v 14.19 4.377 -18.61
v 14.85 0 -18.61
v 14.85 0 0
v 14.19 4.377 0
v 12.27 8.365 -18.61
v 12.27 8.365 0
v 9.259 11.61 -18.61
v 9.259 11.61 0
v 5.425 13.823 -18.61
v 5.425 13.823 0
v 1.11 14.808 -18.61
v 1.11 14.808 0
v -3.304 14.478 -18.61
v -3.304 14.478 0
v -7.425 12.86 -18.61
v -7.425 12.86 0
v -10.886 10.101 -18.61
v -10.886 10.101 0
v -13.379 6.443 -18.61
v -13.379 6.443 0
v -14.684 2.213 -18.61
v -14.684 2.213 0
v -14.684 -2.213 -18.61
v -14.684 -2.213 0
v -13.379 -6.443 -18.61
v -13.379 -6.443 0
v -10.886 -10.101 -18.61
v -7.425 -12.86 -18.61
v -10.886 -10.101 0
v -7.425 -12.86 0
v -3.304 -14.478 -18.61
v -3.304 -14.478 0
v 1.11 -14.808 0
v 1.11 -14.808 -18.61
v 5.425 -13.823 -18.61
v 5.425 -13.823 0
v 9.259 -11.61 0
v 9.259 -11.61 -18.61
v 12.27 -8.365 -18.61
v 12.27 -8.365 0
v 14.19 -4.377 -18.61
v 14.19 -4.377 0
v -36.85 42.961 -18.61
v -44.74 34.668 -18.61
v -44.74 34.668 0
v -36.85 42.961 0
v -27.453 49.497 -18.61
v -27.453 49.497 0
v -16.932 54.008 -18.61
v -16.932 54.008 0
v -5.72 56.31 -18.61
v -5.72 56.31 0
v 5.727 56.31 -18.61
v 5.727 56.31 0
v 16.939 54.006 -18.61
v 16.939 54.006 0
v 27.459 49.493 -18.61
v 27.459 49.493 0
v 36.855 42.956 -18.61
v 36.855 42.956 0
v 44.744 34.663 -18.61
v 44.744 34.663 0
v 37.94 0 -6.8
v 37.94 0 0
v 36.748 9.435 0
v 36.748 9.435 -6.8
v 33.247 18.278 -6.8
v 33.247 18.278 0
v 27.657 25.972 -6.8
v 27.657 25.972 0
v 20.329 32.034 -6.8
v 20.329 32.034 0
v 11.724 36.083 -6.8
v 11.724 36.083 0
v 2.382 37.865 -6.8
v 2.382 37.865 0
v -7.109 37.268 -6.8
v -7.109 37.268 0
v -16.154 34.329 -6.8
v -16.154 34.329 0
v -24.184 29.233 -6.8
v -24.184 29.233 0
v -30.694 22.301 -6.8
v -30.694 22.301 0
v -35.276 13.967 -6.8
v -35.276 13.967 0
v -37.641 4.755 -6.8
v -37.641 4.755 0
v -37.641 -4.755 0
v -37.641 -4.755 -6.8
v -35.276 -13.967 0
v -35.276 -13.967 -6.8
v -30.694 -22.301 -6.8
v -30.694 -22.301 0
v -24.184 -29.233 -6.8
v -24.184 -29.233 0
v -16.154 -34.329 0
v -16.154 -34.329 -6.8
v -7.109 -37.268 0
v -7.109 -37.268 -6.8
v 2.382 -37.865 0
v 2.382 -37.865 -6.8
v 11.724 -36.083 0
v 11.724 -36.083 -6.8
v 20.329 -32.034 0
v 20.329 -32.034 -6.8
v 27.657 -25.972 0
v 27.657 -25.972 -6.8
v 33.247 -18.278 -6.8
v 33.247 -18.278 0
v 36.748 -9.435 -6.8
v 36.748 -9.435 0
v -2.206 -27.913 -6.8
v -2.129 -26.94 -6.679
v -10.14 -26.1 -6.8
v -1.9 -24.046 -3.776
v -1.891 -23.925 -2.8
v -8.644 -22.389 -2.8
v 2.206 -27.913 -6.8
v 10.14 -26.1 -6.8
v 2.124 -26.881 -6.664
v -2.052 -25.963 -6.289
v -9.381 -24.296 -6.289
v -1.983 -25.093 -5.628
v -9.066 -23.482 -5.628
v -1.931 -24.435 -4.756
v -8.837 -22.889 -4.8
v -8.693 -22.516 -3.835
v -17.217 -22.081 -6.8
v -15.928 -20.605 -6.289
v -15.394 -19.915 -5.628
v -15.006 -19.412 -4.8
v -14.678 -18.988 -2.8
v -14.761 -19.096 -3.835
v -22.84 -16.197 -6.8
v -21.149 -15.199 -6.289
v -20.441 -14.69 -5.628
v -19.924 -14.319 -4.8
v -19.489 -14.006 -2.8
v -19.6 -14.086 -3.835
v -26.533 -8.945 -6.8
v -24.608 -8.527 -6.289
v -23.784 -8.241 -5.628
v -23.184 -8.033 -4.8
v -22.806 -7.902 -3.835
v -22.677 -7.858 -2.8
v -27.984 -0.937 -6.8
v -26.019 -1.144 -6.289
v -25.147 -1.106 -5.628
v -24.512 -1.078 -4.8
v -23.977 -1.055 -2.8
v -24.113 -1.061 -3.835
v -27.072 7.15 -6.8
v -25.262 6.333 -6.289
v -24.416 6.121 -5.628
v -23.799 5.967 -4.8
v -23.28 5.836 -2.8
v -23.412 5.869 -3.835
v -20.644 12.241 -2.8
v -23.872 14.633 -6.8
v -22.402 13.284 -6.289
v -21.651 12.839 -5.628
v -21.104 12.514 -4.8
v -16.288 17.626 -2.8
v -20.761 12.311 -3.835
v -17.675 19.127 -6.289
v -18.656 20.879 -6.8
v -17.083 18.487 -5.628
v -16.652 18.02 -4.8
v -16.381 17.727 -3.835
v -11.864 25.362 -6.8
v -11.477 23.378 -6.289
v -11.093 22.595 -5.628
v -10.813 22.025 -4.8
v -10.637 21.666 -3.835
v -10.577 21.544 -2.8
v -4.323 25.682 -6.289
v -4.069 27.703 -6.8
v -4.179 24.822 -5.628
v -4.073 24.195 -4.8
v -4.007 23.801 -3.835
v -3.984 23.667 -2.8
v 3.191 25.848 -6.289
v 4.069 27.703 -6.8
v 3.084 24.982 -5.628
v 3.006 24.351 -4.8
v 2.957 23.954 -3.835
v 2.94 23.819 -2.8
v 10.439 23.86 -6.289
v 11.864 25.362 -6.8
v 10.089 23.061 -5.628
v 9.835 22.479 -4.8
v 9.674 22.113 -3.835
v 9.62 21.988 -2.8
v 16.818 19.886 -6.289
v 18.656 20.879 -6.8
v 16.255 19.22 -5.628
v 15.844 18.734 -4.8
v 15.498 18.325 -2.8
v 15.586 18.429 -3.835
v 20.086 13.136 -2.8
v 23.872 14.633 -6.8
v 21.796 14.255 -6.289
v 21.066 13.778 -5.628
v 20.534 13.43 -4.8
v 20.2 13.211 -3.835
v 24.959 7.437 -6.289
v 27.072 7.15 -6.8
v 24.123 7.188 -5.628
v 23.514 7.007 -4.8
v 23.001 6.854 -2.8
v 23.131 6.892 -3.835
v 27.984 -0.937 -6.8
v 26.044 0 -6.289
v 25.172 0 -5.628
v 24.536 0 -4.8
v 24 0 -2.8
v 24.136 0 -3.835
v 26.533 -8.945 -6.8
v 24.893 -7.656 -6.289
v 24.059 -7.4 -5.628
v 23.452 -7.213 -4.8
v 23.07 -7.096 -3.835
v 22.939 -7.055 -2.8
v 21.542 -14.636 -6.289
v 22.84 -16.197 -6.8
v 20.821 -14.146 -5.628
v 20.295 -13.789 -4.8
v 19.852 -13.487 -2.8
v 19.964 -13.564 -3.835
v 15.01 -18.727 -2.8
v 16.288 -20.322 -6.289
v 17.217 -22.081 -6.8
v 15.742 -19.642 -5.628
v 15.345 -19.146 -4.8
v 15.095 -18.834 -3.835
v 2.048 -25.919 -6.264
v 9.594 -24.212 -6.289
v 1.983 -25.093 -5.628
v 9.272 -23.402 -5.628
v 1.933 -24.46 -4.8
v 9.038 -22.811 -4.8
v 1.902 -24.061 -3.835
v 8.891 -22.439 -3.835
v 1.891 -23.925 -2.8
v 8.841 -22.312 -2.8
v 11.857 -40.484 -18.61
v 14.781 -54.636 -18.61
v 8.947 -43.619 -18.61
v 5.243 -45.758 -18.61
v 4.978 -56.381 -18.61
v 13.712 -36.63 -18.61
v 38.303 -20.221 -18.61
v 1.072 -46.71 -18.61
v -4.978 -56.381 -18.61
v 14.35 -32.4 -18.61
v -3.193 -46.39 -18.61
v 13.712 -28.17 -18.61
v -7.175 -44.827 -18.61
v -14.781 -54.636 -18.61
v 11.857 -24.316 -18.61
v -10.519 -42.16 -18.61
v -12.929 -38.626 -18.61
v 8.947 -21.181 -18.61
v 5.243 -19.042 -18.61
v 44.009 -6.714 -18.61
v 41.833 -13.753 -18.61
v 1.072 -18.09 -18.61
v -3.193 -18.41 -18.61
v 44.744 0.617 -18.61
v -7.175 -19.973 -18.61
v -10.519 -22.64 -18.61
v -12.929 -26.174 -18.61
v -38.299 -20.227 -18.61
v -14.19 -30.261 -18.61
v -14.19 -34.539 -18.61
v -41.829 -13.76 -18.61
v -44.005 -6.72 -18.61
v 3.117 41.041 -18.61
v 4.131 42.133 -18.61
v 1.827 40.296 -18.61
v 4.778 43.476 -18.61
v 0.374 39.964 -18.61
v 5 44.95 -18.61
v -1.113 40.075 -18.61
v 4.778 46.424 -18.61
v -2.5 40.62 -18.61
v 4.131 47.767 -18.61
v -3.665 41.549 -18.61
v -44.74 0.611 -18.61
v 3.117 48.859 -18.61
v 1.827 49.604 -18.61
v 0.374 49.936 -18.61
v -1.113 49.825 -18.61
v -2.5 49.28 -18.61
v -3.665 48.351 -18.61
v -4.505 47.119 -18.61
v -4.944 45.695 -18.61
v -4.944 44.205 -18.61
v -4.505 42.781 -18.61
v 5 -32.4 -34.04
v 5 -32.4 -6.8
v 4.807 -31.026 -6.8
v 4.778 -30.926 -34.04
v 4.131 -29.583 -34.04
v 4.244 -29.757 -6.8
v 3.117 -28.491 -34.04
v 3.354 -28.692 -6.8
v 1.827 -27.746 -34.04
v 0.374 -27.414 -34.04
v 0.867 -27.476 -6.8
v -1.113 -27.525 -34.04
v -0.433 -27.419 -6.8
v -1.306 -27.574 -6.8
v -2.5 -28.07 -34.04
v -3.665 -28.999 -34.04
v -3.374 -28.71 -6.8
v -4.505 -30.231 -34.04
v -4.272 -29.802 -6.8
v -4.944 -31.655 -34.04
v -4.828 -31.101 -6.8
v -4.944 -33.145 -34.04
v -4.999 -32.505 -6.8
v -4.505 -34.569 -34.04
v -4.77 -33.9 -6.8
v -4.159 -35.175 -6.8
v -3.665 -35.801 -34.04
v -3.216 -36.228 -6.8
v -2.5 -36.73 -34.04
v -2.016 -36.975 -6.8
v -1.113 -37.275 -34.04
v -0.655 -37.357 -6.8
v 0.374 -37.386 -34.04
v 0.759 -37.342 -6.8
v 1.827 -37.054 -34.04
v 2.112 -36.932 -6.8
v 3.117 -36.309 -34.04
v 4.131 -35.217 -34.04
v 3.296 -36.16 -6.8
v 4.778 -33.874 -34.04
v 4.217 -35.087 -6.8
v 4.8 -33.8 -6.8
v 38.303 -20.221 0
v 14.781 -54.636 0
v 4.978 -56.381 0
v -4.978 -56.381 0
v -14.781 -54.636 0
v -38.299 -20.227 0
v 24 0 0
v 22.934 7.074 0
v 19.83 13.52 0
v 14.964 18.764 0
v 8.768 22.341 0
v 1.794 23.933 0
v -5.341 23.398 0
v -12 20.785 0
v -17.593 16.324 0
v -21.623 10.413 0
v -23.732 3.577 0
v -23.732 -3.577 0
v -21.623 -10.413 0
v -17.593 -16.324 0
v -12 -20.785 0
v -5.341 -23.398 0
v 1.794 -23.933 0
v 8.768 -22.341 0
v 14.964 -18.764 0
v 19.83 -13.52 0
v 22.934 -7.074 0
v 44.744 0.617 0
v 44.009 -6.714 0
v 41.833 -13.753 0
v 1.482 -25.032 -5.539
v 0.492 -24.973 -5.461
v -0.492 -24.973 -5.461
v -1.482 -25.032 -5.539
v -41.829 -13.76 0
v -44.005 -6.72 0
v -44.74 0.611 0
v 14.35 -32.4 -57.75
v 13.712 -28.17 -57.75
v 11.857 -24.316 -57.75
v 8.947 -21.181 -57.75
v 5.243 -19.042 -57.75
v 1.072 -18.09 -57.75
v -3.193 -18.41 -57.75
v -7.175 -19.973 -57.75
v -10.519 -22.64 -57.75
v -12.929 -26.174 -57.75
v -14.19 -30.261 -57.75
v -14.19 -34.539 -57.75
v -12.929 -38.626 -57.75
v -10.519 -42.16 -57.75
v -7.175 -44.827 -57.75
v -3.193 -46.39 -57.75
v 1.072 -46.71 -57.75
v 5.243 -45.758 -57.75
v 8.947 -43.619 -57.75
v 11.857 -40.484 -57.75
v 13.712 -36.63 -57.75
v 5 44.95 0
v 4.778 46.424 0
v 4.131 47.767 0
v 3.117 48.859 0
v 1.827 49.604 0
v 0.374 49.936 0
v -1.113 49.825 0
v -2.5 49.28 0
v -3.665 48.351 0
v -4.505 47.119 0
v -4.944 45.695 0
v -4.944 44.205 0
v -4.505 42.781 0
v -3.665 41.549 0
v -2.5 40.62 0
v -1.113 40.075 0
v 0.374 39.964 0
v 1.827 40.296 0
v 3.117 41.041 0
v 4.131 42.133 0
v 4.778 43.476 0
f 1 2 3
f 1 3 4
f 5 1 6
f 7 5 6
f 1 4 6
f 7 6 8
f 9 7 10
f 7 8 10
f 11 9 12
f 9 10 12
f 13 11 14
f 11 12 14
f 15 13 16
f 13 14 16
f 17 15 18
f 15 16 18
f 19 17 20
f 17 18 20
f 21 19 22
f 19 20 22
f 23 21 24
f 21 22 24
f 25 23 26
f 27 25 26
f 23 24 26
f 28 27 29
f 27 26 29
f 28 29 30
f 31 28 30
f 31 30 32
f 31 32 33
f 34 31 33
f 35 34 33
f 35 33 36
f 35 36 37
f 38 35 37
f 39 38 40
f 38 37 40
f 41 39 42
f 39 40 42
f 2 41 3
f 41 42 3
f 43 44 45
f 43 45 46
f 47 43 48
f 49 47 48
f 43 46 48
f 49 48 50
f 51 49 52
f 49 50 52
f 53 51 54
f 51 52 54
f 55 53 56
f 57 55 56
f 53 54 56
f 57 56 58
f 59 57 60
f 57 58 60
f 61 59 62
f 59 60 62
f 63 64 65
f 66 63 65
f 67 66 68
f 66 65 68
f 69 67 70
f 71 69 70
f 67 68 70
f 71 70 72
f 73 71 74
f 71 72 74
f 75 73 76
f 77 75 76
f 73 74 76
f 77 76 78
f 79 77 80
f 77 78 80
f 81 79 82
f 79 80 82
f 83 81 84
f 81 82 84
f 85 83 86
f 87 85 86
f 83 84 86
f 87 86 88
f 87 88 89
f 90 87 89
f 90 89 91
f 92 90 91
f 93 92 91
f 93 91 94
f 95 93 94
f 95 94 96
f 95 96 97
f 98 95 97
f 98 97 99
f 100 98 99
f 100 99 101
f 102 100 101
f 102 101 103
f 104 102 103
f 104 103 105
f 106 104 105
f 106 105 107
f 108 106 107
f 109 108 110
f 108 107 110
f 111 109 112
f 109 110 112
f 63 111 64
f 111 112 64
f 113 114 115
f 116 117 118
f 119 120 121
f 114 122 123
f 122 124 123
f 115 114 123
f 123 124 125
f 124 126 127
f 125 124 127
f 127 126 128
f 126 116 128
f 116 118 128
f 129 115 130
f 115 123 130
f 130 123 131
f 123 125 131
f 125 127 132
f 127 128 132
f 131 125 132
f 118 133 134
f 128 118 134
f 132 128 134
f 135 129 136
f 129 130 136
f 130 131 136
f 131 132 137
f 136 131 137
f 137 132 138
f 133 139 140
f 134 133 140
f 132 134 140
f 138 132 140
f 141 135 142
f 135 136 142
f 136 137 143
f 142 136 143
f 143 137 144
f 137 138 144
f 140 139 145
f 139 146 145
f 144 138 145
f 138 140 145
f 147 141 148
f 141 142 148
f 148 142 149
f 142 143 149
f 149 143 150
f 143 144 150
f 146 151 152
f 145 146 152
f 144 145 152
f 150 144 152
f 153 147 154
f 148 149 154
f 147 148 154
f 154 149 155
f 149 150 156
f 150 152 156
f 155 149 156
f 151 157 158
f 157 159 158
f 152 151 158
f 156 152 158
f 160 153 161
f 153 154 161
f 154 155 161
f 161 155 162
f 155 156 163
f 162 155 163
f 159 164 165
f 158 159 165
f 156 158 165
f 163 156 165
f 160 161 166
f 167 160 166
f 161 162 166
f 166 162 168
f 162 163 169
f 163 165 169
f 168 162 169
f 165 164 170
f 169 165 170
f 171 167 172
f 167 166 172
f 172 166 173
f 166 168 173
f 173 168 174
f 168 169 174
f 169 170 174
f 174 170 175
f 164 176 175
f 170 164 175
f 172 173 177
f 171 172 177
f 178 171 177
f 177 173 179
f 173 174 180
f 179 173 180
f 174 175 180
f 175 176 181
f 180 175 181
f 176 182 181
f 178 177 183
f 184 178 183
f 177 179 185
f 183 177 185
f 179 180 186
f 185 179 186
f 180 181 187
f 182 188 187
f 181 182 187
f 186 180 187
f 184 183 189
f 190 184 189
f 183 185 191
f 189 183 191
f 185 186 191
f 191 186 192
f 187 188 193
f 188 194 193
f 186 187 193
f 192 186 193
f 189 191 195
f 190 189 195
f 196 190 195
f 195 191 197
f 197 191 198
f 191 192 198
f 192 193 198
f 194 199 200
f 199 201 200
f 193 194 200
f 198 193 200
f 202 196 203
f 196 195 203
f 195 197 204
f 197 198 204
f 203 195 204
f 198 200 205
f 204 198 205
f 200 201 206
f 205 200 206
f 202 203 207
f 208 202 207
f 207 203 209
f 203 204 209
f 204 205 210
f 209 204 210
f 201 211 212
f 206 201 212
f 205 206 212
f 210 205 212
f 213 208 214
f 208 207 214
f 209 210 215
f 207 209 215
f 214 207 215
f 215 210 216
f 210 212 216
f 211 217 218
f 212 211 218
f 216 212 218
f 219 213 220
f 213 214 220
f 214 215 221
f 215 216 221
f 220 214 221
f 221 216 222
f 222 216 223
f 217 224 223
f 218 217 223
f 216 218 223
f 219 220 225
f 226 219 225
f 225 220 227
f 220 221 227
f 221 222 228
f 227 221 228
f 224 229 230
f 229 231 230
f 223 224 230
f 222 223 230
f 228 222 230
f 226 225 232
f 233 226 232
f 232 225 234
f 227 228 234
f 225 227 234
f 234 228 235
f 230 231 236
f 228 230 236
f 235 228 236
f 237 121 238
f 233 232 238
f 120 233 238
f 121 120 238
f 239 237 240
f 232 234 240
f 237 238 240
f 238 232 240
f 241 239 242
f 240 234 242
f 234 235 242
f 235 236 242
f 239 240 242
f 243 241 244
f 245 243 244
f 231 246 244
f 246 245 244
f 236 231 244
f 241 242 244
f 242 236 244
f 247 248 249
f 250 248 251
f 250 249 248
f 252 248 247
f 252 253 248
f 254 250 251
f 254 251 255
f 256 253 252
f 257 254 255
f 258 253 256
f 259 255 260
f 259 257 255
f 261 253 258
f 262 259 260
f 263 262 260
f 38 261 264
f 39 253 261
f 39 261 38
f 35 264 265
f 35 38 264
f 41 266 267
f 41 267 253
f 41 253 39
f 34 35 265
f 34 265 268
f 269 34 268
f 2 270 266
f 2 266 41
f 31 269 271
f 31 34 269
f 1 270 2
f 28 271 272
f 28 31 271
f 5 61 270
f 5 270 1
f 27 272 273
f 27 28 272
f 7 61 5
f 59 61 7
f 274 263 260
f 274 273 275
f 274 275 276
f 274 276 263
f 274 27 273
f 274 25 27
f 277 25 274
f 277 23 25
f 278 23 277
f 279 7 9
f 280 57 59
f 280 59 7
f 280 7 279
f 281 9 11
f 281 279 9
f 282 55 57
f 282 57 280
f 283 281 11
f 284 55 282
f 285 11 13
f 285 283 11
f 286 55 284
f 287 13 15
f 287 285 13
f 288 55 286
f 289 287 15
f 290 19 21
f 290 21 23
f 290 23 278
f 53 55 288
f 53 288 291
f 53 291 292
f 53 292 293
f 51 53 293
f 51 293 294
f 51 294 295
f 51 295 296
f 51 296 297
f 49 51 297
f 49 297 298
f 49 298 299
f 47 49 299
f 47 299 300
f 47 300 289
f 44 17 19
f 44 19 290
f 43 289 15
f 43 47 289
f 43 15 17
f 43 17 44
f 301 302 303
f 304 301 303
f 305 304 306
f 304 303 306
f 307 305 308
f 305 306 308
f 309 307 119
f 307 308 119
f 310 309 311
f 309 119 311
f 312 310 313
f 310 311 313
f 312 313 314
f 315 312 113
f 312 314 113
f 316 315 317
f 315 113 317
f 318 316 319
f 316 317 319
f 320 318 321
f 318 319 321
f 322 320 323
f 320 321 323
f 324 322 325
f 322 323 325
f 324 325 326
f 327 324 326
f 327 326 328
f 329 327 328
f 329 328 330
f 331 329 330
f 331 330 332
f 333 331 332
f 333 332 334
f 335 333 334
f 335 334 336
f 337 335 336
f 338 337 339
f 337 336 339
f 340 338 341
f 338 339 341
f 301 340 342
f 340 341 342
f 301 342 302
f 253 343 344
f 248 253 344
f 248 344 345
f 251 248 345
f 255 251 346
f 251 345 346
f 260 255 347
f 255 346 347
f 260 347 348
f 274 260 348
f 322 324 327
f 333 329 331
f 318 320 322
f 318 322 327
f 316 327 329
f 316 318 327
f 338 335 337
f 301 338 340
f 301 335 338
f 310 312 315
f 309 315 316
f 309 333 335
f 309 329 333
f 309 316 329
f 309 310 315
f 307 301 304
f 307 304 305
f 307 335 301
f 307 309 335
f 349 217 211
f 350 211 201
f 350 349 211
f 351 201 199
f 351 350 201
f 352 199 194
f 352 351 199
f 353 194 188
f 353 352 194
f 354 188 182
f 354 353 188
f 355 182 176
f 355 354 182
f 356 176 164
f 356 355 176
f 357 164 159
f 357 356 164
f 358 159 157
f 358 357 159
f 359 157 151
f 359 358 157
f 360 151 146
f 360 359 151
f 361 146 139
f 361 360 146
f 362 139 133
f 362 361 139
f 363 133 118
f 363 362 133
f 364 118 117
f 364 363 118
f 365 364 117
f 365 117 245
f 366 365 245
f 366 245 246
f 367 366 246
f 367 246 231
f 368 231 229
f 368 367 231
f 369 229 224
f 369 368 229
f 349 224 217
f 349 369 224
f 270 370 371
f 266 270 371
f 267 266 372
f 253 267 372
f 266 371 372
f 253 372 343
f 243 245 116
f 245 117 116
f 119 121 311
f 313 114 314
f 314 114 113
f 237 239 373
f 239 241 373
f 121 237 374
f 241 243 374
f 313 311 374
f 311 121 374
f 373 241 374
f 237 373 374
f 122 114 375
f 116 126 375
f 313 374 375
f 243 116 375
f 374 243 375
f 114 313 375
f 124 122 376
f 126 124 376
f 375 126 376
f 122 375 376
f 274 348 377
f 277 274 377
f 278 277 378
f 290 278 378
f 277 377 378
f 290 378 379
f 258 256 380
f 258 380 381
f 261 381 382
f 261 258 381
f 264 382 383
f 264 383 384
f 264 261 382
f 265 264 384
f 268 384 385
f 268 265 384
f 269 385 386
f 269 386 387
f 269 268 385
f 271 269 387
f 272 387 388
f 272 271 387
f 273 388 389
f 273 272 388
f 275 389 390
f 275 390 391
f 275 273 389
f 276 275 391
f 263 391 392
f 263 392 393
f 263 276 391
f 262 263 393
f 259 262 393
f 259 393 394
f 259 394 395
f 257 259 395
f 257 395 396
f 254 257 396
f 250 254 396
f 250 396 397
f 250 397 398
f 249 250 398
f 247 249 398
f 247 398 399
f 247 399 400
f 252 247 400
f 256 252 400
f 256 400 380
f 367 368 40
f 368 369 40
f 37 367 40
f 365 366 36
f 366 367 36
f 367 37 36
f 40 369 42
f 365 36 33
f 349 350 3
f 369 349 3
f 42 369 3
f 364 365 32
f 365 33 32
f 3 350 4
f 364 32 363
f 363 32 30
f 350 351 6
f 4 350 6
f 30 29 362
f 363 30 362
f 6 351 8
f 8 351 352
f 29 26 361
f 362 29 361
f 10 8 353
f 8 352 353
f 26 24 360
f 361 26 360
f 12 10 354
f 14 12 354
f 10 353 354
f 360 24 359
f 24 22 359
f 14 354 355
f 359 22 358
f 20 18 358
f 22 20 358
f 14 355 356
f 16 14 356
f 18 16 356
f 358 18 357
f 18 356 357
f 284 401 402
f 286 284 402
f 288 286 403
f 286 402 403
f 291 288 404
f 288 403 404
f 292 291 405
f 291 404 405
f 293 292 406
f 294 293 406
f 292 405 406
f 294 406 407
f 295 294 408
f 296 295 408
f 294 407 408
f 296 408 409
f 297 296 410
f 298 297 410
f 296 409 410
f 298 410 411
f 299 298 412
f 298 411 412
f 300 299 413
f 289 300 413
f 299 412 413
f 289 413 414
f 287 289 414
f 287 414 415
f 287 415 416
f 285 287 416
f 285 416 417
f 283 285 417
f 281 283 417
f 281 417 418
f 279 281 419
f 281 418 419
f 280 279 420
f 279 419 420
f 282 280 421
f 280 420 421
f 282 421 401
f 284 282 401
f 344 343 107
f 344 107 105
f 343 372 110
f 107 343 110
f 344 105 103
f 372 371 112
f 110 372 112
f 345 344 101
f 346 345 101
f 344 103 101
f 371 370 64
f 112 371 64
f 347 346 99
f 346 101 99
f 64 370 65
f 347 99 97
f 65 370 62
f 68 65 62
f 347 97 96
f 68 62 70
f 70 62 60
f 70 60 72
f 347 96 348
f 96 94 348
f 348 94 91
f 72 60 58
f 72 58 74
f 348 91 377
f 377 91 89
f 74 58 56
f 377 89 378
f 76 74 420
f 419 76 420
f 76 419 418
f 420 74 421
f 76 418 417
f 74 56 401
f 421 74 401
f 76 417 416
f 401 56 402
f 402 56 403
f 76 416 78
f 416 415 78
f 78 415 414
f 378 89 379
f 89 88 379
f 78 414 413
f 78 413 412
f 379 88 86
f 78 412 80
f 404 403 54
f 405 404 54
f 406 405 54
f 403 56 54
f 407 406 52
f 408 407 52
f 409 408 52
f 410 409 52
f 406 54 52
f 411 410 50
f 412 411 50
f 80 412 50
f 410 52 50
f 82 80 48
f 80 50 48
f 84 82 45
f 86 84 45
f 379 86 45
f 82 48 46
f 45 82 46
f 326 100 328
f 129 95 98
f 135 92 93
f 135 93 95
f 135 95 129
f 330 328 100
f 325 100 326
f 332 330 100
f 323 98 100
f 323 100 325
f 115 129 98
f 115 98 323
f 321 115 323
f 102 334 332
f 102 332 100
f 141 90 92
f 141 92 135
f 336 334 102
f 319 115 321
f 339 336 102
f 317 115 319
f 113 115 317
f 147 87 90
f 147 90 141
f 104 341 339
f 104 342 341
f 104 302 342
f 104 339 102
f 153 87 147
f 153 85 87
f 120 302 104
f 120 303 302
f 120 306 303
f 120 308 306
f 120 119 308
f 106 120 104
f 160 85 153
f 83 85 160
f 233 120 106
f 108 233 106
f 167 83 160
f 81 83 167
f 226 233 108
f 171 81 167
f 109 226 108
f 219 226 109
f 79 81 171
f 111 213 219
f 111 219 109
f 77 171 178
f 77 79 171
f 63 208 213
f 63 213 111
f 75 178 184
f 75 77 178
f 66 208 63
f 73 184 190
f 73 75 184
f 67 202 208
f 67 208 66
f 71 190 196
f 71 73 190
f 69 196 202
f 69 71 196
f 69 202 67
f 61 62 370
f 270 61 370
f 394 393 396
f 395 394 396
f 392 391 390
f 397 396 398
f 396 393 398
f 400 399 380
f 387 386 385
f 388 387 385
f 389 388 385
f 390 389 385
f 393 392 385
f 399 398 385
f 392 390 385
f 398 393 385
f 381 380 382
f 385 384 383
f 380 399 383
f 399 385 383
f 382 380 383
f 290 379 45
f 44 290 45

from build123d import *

# Parameters (mm, degrees)
SKETCH1_R           = 5
SKETCH1_R_2         = 14.85
BOSS_EXTRUDE1_DEPTH = 18.61
SKETCH3_R           = 37.94
SKETCH3_R_2         = 24
CUT_EXTRUDE1_DEPTH  = 6.8
SKETCH4_R           = 14.35
BOSS_EXTRUDE2_DEPTH = 50.95
SKETCH5_R           = 5
CUT_EXTRUDE2_DEPTH  = 27.24
FILLET1_R           = 4


with BuildPart() as part:
    # Sketch1 → Boss-Extrude1 (new body)
    with BuildSketch(Plane.XY):
        with BuildLine():
            Line((44.744350737, 34.662704412), (44.744350737, 0.617322885))
            ThreePointArc((44.744350737, 0.617322885), (43.097385261, -10.288147364), (38.303391852, -20.220891388))
            Line((38.303391852, -20.220891388), (14.7812281, -54.635842593))
            ThreePointArc((14.7812281, -54.635842593), (0, -56.6), (-14.7812281, -54.635842593))
            Line((-14.7812281, -54.635842593), (-38.299041115, -20.22725689))
            ThreePointArc((-38.299041115, -20.22725689), (-43.093034524, -10.294512867), (-44.74, 0.610957382))
            Line((-44.74, 0.610957382), (-44.74, 34.668319832))
            ThreePointArc((-44.74, 34.668319832), (0.003551826, 56.599999889), (44.744350737, 34.662704412))
        make_face()
        with Locations((0, 44.95)):
            Circle(SKETCH1_R, mode=Mode.SUBTRACT)
        Circle(SKETCH1_R_2, mode=Mode.SUBTRACT)
    extrude(amount=-BOSS_EXTRUDE1_DEPTH)

    # Sketch3 → Cut-Extrude1 (cut)
    with BuildSketch(Plane.XY):
        Circle(SKETCH3_R)
        Circle(SKETCH3_R_2, mode=Mode.SUBTRACT)
    extrude(amount=-CUT_EXTRUDE1_DEPTH, mode=Mode.SUBTRACT)

    # Sketch4 → Boss-Extrude2 (add)
    with BuildSketch(Plane.XY.offset(-6.8)):
        with Locations((0, -32.4)):
            Circle(SKETCH4_R)
    extrude(amount=-BOSS_EXTRUDE2_DEPTH)

    # Sketch5 → Cut-Extrude2 (cut)
    with BuildSketch(Plane.XY.offset(-6.8)):
        with Locations((0, -32.4)):
            Circle(SKETCH5_R)
    extrude(amount=-CUT_EXTRUDE2_DEPTH, mode=Mode.SUBTRACT)

    # Fillet1
    fillet1_edges = [part.edges().sort_by_distance(p)[0] for p in [
        (-24, 0, -6.8),
    ]]
    fillet(fillet1_edges, radius=FILLET1_R)


solid = part.part
